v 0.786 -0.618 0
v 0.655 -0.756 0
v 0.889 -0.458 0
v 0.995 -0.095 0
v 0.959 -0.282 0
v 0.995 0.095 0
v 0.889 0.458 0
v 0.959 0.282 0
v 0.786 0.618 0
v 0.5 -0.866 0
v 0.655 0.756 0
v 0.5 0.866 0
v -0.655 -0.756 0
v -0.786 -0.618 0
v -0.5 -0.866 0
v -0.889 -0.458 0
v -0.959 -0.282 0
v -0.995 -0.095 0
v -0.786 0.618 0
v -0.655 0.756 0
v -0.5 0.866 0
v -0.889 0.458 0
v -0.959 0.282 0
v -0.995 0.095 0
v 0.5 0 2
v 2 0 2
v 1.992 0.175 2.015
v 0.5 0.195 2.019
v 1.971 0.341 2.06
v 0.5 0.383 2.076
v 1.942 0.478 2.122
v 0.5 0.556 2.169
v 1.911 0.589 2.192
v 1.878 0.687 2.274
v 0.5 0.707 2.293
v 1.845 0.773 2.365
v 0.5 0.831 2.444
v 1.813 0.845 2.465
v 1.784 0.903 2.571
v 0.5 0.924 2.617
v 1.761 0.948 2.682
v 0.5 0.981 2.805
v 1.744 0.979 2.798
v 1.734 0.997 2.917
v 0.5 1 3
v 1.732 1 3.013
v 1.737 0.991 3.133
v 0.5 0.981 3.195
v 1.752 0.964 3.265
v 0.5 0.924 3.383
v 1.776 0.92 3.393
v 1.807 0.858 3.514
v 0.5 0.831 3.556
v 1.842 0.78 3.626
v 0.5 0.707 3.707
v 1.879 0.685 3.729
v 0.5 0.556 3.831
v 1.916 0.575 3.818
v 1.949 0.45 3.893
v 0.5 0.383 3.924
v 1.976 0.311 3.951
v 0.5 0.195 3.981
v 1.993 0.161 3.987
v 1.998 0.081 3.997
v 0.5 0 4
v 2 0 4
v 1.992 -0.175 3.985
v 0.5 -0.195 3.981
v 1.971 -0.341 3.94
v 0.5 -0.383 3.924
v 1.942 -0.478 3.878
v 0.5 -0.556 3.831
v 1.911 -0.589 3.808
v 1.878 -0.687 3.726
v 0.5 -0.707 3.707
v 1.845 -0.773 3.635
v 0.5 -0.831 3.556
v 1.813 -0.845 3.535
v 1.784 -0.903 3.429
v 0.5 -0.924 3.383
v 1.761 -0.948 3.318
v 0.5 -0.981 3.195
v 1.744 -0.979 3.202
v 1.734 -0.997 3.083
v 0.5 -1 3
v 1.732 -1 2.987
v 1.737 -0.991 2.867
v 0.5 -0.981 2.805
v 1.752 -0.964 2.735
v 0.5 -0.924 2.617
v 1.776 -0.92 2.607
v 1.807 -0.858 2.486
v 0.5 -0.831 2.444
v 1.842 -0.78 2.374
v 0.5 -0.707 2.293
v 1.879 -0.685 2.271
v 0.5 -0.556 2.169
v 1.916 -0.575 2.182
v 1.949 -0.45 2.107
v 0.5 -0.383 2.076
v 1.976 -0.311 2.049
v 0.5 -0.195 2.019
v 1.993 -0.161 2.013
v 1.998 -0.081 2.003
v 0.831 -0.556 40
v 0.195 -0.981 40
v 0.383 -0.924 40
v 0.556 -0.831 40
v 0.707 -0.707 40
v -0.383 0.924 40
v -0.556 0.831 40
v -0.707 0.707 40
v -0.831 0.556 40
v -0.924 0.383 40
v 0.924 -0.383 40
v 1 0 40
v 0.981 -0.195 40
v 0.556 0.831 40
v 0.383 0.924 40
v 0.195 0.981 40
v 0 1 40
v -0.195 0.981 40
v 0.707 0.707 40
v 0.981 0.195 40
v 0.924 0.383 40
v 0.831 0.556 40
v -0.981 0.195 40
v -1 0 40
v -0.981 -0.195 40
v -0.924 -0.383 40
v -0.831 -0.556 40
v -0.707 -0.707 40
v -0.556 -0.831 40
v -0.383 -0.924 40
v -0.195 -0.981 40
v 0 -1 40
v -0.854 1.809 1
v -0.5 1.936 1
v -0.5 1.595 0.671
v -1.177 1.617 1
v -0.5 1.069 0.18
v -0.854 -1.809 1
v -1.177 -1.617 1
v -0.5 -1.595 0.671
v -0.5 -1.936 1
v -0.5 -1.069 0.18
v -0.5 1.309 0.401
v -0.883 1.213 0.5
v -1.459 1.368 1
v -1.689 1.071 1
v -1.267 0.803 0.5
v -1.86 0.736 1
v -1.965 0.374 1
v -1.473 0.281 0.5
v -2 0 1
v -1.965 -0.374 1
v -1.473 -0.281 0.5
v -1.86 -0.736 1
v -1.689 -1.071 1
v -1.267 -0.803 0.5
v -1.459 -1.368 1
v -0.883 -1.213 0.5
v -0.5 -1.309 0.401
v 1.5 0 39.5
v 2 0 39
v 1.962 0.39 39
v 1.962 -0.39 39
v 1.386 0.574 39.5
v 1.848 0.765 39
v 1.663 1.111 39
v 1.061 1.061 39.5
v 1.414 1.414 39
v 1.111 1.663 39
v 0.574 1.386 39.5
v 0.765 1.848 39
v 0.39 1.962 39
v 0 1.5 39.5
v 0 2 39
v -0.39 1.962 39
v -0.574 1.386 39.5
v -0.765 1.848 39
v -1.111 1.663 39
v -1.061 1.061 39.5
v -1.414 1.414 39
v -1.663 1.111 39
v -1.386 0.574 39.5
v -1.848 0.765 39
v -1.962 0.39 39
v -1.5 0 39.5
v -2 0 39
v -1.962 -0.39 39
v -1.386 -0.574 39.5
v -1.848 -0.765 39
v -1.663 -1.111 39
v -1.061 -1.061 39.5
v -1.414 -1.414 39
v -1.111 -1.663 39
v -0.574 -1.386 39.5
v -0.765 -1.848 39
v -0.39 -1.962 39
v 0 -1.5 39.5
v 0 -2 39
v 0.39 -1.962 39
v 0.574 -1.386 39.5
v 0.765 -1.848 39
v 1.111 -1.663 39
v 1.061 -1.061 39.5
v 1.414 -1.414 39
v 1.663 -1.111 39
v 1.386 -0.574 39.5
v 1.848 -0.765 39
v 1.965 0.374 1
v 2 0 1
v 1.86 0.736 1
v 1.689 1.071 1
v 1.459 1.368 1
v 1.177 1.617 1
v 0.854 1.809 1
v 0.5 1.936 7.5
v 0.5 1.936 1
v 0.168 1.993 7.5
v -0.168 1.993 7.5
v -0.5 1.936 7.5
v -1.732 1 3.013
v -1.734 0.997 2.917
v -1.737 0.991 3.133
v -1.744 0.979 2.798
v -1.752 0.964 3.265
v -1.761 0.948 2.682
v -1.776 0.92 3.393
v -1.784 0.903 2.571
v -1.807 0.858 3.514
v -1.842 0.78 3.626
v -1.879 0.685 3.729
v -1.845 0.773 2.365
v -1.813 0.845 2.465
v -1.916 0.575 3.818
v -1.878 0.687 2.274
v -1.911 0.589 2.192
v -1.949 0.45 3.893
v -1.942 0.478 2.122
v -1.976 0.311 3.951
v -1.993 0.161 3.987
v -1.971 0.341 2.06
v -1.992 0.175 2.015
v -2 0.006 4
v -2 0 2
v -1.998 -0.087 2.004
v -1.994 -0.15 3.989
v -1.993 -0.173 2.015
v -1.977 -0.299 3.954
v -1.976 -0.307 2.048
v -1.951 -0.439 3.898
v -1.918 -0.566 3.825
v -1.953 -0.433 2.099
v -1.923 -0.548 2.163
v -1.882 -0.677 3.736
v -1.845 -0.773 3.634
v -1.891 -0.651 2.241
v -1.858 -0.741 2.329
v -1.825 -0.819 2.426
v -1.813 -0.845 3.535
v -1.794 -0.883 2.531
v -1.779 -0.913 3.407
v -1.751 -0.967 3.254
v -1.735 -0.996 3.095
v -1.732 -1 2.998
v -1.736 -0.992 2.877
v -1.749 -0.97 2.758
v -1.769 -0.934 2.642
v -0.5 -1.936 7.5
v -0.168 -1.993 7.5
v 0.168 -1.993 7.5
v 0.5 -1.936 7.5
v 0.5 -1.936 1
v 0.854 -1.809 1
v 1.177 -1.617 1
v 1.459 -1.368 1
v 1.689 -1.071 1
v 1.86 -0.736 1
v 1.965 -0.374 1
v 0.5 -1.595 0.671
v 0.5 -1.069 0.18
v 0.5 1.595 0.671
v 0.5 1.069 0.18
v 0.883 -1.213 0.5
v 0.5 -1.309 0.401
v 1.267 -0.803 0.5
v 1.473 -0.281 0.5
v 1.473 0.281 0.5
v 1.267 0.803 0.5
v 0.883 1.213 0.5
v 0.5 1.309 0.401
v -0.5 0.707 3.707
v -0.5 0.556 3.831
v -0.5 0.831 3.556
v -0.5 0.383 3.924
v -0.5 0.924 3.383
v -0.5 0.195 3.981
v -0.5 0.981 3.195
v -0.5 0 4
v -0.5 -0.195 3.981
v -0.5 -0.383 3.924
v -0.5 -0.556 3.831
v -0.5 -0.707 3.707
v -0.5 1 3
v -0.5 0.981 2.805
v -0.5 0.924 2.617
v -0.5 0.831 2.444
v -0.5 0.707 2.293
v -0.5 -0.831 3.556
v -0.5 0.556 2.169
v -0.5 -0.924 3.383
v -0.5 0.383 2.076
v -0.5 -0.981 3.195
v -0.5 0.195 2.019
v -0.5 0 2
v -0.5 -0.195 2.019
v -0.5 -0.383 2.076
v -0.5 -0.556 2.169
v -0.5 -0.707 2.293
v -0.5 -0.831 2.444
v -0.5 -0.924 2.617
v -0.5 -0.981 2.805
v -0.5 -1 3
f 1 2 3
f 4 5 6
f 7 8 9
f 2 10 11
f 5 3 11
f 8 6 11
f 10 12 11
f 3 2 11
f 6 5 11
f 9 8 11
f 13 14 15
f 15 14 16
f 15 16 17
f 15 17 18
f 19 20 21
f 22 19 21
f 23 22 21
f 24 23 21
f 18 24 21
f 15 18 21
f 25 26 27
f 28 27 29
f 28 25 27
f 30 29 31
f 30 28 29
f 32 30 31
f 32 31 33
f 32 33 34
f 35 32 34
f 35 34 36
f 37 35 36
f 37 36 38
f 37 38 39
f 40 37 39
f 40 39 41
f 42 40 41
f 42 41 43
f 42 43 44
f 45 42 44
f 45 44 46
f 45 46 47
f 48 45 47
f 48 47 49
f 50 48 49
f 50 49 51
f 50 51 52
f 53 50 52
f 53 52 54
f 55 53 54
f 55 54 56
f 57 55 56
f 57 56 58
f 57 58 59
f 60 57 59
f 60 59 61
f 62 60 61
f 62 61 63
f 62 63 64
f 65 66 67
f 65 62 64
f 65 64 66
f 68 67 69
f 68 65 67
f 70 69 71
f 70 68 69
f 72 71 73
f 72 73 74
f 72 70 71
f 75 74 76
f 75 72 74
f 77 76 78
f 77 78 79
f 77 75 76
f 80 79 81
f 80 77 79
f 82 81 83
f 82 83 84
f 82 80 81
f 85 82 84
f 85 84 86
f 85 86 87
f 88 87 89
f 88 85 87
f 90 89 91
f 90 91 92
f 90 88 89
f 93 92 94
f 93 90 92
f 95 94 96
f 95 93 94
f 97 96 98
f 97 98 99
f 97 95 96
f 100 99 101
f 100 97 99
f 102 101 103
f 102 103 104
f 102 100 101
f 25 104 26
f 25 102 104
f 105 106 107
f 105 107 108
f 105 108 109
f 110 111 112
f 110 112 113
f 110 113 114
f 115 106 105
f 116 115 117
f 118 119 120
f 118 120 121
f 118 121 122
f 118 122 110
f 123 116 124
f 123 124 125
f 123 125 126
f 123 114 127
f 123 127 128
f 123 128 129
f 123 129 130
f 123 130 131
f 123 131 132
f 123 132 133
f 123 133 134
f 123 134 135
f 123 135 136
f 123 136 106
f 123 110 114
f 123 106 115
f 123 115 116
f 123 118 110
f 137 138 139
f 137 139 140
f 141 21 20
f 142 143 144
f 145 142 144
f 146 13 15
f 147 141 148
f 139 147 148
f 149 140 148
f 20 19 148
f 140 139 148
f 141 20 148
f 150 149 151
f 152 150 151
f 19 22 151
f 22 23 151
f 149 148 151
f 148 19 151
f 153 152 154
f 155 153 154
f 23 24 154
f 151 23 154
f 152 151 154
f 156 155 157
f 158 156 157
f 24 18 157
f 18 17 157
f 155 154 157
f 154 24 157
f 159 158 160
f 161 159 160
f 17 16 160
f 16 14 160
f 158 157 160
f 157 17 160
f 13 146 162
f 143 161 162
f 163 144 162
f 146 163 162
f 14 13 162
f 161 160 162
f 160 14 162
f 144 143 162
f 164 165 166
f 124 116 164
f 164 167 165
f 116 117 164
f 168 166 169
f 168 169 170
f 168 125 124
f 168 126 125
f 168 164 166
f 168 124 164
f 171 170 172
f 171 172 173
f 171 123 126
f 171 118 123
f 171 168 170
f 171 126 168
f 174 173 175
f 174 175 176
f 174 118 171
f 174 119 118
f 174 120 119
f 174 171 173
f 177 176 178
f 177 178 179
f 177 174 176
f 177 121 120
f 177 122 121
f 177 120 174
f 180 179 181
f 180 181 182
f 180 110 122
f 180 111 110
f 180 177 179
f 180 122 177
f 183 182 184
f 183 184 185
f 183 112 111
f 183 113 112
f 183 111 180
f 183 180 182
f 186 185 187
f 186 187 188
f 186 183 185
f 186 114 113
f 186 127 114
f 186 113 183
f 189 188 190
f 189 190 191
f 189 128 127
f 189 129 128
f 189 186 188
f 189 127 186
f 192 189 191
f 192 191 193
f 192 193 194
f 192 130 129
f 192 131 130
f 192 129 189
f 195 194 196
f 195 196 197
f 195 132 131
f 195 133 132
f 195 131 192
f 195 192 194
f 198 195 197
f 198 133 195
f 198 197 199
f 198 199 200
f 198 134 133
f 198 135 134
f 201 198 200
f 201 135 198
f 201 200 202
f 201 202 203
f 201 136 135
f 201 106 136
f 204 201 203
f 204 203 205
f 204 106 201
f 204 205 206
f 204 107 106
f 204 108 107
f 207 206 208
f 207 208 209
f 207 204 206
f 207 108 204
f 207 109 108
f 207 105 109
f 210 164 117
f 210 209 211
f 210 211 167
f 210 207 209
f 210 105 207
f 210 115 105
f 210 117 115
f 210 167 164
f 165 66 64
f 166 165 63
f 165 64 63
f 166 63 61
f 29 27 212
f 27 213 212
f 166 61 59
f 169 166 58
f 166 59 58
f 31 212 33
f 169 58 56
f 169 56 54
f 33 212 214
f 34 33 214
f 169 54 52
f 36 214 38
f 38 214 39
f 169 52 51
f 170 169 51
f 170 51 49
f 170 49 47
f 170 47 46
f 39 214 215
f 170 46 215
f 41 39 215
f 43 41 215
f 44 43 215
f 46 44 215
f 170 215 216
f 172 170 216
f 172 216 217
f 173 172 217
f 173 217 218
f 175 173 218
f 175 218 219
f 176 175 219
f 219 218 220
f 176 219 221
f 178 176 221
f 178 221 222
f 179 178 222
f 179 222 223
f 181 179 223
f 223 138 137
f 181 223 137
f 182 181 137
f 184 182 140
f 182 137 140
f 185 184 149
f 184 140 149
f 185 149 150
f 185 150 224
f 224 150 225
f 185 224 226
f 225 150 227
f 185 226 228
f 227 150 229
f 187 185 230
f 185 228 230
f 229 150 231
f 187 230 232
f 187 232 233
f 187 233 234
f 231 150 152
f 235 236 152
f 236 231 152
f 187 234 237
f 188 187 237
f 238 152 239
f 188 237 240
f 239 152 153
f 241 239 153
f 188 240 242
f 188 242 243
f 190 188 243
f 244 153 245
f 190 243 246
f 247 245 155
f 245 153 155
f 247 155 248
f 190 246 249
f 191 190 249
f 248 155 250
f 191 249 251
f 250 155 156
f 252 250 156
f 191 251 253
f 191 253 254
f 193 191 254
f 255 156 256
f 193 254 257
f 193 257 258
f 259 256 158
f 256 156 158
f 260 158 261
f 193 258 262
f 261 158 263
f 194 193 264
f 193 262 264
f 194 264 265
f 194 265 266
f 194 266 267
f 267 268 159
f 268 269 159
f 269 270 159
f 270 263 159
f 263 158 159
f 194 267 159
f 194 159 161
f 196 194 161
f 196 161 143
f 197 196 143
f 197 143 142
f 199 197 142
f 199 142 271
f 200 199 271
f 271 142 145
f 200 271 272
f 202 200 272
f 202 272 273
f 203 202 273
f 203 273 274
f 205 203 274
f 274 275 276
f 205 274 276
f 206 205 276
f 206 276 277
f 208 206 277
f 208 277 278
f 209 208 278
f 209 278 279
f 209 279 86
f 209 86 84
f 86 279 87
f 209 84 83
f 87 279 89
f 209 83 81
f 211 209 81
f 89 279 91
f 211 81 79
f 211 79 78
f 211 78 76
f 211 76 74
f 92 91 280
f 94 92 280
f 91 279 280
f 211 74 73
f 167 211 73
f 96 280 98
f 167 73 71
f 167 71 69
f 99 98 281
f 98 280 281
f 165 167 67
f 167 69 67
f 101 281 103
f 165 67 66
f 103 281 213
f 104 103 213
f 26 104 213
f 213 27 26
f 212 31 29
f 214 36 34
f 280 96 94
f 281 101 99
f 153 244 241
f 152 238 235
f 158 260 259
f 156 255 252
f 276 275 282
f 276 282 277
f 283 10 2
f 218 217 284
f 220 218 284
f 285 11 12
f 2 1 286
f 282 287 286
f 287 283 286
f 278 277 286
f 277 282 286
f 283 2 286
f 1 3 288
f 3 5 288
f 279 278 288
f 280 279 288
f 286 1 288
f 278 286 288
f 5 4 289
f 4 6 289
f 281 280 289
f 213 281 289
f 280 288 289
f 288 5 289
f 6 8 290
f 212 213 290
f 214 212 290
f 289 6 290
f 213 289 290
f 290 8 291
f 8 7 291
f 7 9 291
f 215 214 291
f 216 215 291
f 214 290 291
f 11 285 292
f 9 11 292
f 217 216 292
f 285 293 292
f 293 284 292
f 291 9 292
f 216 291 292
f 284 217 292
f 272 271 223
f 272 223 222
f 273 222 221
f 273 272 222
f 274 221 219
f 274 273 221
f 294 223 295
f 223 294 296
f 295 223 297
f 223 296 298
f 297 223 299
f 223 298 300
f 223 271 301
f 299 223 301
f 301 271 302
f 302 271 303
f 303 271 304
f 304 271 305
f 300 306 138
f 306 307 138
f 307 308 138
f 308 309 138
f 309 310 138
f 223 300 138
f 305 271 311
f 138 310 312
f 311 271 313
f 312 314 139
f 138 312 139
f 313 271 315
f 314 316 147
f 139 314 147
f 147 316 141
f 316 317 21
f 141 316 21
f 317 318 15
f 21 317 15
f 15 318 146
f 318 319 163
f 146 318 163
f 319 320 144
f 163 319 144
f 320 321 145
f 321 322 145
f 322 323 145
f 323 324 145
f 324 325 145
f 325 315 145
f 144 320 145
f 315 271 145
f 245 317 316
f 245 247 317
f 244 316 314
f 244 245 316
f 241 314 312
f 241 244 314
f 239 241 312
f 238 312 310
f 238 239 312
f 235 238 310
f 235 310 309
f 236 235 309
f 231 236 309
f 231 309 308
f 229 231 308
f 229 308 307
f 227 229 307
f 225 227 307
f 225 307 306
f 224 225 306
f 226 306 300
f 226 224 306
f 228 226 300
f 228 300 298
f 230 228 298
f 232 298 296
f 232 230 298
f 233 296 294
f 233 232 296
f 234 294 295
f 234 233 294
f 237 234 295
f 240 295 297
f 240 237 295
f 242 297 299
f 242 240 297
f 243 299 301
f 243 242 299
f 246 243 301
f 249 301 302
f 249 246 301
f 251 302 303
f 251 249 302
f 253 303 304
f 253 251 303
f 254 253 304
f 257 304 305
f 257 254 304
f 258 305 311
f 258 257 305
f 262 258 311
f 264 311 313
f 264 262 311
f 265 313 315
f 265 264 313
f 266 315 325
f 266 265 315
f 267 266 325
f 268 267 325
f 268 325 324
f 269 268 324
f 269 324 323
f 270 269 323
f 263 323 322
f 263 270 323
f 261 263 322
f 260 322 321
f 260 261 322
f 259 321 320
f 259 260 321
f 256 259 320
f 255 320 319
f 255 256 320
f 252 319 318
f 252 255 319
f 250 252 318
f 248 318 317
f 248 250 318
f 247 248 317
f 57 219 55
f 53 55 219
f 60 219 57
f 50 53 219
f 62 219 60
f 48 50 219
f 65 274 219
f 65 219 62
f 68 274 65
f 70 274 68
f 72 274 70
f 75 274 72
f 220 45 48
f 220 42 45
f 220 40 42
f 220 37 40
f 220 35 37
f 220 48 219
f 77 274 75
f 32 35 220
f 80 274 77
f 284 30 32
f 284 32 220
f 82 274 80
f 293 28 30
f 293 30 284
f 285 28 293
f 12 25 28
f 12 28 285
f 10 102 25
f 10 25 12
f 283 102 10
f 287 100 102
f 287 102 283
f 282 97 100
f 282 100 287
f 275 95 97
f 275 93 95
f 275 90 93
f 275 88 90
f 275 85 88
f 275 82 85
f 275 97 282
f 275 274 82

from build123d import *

# Parameters (mm, degrees)
SKETCH_1_R                 = 2
EXTRUDE_338_DEPTH          = 40
CHAMFER_1_SIZE             = 1
CUT_EXTRUDE_518_DEPTH      = 41.099875312
CUT_EXTRUDE_518_DEPTH_BACK = 41.099875312
SKETCH_2_W                 = 1
SKETCH_2_H                 = 7.5
CUT_EXTRUDE_2_DEPTH        = 41.099875312
CUT_EXTRUDE_2_DEPTH_BACK   = 41.099875312
SKETCH_3_R                 = 1


with BuildPart() as part:
    # Эскиз1 → Extrude 338 (new body)
    with BuildSketch(Plane.XY):
        Circle(SKETCH_1_R)
    extrude(amount=EXTRUDE_338_DEPTH)

    # Фаска1
    chamfer_1_edges = [part.edges().sort_by_distance(p)[0] for p in [
        (-2, 0, 0),
        (-2, 0, 40),
    ]]
    chamfer(chamfer_1_edges, length=CHAMFER_1_SIZE)

    # Эскиз2 → Cut-Extrude 518 (cut, two sides: drawn at the far end of the back side and taken through both)
    with BuildSketch(Plane(origin=(0, 0, 0), x_dir=(1, 0, 0), z_dir=(0, 1, 0)).offset(-CUT_EXTRUDE_518_DEPTH_BACK)):
        with Locations((0, -3.75)):
            Rectangle(SKETCH_2_W, SKETCH_2_H)
    extrude(amount=CUT_EXTRUDE_518_DEPTH + CUT_EXTRUDE_518_DEPTH_BACK, mode=Mode.SUBTRACT)

    # Эскиз3 → Вырез-Вытянуть2 (cut, two sides: drawn at the far end of the back side and taken through both)
    with BuildSketch(Plane(origin=(0, 0, 0), x_dir=(0, 0, -1), z_dir=(1, 0, 0)).offset(-CUT_EXTRUDE_2_DEPTH_BACK)):
        with Locations((-3, 0)):
            Circle(SKETCH_3_R)
    extrude(amount=CUT_EXTRUDE_2_DEPTH + CUT_EXTRUDE_2_DEPTH_BACK, mode=Mode.SUBTRACT)


solid = part.part
